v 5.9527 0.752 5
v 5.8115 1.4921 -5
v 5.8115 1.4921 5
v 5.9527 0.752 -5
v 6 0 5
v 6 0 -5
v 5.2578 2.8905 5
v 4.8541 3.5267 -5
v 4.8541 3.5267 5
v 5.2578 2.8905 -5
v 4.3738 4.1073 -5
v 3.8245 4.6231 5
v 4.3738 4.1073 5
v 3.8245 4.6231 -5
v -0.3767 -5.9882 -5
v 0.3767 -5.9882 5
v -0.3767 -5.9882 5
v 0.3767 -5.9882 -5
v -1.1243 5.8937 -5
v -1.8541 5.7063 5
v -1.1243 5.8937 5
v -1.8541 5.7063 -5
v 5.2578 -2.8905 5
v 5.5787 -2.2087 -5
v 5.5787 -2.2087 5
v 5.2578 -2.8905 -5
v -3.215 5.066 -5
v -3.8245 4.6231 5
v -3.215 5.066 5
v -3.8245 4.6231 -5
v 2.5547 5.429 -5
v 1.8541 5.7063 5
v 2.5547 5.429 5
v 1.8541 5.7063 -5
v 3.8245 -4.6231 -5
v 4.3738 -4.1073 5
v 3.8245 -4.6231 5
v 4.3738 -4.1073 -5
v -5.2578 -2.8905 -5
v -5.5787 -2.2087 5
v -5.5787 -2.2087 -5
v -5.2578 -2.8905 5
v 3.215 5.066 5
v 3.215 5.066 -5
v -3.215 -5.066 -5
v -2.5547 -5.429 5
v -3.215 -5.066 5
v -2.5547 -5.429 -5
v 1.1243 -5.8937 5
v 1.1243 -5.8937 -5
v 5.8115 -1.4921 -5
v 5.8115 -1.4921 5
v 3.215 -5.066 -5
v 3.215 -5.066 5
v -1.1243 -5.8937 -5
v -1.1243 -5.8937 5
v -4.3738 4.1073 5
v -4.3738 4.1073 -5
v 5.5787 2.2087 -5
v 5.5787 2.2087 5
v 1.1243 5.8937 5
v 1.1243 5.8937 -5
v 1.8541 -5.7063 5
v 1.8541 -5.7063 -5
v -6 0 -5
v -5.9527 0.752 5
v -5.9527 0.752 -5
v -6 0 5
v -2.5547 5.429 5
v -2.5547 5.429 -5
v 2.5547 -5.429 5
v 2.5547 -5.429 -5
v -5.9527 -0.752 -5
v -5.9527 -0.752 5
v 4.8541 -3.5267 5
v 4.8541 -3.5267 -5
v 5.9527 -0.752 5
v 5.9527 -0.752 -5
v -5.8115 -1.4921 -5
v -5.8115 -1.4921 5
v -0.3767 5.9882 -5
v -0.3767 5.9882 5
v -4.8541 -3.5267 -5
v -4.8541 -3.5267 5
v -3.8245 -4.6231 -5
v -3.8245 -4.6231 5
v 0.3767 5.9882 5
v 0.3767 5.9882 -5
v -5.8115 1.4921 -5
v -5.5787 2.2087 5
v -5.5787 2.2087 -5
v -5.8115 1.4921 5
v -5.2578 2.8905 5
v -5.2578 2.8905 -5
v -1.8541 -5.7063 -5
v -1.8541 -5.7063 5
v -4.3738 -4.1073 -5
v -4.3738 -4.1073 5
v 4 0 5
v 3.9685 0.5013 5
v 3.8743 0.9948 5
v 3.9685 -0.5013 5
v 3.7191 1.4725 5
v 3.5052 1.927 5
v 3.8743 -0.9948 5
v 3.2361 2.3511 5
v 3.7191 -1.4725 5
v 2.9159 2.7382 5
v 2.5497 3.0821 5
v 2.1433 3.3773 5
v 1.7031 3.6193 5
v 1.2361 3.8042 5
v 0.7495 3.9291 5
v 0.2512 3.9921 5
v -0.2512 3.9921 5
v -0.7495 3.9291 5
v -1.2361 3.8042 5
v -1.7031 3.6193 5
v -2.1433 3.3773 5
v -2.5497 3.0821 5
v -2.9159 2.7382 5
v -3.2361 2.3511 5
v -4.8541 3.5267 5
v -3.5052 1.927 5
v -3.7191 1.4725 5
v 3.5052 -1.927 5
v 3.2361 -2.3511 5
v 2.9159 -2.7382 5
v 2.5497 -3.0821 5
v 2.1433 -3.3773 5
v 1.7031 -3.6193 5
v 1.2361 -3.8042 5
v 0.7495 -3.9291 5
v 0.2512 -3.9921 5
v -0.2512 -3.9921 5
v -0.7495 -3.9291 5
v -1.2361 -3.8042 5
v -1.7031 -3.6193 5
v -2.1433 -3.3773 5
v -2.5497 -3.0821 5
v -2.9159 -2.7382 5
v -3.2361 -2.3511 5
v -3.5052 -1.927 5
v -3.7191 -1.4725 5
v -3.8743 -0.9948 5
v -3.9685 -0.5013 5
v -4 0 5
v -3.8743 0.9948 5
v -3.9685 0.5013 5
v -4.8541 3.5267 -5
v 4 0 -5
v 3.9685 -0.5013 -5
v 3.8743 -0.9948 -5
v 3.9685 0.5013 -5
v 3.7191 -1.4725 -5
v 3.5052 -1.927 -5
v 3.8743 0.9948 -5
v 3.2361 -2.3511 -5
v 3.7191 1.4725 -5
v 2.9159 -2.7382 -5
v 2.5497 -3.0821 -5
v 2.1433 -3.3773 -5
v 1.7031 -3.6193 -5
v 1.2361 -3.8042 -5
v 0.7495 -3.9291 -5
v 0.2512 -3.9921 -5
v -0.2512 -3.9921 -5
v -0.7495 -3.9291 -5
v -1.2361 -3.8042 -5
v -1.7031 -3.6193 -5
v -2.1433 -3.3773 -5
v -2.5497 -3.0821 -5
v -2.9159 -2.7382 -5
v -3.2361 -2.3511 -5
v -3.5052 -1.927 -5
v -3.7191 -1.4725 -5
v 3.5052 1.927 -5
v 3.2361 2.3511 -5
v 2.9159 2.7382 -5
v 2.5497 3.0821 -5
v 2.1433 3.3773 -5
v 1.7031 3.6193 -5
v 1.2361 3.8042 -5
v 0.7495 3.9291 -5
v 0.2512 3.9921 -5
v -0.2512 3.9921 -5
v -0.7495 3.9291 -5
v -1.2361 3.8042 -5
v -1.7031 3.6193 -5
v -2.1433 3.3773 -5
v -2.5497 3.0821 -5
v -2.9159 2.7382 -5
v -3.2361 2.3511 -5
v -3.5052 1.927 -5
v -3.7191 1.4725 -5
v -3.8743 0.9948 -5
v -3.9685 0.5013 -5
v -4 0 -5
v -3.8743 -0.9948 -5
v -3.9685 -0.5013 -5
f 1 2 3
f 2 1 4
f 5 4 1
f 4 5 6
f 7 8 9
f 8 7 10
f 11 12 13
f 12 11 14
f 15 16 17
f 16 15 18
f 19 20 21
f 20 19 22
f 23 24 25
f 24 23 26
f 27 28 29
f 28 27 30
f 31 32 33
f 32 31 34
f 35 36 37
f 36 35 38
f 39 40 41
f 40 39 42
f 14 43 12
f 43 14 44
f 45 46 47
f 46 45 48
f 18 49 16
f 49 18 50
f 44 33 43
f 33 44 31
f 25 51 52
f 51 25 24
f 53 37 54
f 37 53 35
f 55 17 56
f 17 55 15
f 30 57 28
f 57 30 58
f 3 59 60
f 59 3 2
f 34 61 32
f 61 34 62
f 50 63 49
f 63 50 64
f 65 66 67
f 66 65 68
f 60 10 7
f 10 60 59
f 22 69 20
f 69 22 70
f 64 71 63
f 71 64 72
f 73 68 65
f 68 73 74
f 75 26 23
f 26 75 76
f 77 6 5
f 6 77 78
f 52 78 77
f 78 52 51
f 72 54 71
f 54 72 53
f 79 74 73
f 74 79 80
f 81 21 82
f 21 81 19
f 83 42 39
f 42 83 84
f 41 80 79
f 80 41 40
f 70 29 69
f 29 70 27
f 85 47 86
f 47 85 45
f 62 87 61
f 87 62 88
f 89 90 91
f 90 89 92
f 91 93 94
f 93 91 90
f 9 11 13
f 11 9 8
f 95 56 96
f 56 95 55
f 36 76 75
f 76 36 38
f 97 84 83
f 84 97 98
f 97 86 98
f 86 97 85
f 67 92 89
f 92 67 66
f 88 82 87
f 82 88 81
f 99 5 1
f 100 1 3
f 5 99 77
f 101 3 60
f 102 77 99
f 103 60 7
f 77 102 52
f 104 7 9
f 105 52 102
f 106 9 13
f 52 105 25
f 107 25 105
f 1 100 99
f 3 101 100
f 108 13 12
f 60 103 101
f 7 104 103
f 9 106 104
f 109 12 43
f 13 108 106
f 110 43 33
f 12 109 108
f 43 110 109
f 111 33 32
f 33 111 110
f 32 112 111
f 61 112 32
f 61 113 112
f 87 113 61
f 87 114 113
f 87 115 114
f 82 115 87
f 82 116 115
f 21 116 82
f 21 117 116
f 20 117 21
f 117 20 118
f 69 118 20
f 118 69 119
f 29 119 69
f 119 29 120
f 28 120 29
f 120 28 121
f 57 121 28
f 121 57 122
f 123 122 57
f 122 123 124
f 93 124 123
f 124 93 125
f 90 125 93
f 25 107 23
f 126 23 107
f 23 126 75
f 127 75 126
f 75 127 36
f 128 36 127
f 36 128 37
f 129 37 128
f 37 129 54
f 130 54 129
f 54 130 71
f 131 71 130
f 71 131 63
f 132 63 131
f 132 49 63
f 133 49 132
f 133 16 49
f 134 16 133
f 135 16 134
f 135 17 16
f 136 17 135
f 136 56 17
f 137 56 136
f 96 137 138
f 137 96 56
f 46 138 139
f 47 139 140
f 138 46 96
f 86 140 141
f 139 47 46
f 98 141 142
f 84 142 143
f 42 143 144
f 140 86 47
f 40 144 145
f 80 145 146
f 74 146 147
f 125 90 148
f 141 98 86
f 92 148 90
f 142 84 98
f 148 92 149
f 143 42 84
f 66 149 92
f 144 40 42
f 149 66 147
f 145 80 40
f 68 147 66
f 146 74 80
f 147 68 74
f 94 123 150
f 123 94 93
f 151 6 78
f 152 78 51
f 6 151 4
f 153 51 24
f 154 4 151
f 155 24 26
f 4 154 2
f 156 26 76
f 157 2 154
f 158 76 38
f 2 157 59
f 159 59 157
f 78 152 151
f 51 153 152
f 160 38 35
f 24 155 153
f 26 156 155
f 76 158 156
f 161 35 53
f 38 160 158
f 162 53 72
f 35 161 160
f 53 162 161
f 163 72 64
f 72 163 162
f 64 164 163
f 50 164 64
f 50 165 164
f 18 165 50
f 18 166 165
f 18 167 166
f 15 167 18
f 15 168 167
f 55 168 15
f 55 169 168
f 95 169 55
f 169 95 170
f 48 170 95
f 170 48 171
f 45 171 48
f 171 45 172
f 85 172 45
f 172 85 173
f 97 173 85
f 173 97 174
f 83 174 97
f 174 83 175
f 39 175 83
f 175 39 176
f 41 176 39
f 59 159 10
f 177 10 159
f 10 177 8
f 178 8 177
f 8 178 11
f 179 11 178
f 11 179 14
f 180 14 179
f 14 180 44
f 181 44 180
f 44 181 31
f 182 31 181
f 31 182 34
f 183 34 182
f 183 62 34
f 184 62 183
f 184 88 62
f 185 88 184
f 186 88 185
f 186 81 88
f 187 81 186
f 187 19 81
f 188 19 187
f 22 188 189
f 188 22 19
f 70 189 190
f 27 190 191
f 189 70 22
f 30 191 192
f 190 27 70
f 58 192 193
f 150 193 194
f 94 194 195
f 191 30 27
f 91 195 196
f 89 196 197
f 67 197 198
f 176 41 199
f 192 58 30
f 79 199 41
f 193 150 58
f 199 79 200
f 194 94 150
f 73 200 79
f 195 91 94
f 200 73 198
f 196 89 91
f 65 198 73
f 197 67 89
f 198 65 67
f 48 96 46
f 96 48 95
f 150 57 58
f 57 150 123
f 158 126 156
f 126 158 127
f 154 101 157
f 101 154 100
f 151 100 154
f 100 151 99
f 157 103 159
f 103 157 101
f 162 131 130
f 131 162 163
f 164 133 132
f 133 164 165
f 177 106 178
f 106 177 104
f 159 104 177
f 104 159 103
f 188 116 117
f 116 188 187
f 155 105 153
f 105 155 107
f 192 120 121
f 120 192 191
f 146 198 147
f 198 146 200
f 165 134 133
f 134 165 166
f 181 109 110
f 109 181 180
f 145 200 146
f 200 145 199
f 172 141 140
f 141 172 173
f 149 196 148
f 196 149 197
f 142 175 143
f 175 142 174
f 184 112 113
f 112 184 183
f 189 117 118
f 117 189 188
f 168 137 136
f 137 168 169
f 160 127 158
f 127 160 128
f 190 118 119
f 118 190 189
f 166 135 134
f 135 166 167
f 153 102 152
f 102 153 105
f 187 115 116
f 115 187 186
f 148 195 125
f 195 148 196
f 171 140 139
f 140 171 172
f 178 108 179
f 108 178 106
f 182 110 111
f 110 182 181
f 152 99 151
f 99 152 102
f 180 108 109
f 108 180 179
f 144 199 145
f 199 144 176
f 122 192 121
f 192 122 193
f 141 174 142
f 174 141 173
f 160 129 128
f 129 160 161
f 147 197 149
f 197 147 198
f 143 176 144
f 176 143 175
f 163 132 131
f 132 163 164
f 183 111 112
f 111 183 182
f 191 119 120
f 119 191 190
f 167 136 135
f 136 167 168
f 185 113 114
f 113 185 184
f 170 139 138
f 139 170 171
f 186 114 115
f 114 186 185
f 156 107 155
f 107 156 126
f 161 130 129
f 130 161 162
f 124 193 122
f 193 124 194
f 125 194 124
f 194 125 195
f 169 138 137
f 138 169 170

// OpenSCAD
$fn = 50;


difference() {
	union() {
		translate(v = [0, 0, -5.0000000000]) {
			cylinder(h = 10, r = 6.0000000000);
		}
	}
	union() {
		translate(v = [0, 0, -100.0000000000]) {
			cylinder(h = 200, r = 4.0000000000);
		}
	}
}
